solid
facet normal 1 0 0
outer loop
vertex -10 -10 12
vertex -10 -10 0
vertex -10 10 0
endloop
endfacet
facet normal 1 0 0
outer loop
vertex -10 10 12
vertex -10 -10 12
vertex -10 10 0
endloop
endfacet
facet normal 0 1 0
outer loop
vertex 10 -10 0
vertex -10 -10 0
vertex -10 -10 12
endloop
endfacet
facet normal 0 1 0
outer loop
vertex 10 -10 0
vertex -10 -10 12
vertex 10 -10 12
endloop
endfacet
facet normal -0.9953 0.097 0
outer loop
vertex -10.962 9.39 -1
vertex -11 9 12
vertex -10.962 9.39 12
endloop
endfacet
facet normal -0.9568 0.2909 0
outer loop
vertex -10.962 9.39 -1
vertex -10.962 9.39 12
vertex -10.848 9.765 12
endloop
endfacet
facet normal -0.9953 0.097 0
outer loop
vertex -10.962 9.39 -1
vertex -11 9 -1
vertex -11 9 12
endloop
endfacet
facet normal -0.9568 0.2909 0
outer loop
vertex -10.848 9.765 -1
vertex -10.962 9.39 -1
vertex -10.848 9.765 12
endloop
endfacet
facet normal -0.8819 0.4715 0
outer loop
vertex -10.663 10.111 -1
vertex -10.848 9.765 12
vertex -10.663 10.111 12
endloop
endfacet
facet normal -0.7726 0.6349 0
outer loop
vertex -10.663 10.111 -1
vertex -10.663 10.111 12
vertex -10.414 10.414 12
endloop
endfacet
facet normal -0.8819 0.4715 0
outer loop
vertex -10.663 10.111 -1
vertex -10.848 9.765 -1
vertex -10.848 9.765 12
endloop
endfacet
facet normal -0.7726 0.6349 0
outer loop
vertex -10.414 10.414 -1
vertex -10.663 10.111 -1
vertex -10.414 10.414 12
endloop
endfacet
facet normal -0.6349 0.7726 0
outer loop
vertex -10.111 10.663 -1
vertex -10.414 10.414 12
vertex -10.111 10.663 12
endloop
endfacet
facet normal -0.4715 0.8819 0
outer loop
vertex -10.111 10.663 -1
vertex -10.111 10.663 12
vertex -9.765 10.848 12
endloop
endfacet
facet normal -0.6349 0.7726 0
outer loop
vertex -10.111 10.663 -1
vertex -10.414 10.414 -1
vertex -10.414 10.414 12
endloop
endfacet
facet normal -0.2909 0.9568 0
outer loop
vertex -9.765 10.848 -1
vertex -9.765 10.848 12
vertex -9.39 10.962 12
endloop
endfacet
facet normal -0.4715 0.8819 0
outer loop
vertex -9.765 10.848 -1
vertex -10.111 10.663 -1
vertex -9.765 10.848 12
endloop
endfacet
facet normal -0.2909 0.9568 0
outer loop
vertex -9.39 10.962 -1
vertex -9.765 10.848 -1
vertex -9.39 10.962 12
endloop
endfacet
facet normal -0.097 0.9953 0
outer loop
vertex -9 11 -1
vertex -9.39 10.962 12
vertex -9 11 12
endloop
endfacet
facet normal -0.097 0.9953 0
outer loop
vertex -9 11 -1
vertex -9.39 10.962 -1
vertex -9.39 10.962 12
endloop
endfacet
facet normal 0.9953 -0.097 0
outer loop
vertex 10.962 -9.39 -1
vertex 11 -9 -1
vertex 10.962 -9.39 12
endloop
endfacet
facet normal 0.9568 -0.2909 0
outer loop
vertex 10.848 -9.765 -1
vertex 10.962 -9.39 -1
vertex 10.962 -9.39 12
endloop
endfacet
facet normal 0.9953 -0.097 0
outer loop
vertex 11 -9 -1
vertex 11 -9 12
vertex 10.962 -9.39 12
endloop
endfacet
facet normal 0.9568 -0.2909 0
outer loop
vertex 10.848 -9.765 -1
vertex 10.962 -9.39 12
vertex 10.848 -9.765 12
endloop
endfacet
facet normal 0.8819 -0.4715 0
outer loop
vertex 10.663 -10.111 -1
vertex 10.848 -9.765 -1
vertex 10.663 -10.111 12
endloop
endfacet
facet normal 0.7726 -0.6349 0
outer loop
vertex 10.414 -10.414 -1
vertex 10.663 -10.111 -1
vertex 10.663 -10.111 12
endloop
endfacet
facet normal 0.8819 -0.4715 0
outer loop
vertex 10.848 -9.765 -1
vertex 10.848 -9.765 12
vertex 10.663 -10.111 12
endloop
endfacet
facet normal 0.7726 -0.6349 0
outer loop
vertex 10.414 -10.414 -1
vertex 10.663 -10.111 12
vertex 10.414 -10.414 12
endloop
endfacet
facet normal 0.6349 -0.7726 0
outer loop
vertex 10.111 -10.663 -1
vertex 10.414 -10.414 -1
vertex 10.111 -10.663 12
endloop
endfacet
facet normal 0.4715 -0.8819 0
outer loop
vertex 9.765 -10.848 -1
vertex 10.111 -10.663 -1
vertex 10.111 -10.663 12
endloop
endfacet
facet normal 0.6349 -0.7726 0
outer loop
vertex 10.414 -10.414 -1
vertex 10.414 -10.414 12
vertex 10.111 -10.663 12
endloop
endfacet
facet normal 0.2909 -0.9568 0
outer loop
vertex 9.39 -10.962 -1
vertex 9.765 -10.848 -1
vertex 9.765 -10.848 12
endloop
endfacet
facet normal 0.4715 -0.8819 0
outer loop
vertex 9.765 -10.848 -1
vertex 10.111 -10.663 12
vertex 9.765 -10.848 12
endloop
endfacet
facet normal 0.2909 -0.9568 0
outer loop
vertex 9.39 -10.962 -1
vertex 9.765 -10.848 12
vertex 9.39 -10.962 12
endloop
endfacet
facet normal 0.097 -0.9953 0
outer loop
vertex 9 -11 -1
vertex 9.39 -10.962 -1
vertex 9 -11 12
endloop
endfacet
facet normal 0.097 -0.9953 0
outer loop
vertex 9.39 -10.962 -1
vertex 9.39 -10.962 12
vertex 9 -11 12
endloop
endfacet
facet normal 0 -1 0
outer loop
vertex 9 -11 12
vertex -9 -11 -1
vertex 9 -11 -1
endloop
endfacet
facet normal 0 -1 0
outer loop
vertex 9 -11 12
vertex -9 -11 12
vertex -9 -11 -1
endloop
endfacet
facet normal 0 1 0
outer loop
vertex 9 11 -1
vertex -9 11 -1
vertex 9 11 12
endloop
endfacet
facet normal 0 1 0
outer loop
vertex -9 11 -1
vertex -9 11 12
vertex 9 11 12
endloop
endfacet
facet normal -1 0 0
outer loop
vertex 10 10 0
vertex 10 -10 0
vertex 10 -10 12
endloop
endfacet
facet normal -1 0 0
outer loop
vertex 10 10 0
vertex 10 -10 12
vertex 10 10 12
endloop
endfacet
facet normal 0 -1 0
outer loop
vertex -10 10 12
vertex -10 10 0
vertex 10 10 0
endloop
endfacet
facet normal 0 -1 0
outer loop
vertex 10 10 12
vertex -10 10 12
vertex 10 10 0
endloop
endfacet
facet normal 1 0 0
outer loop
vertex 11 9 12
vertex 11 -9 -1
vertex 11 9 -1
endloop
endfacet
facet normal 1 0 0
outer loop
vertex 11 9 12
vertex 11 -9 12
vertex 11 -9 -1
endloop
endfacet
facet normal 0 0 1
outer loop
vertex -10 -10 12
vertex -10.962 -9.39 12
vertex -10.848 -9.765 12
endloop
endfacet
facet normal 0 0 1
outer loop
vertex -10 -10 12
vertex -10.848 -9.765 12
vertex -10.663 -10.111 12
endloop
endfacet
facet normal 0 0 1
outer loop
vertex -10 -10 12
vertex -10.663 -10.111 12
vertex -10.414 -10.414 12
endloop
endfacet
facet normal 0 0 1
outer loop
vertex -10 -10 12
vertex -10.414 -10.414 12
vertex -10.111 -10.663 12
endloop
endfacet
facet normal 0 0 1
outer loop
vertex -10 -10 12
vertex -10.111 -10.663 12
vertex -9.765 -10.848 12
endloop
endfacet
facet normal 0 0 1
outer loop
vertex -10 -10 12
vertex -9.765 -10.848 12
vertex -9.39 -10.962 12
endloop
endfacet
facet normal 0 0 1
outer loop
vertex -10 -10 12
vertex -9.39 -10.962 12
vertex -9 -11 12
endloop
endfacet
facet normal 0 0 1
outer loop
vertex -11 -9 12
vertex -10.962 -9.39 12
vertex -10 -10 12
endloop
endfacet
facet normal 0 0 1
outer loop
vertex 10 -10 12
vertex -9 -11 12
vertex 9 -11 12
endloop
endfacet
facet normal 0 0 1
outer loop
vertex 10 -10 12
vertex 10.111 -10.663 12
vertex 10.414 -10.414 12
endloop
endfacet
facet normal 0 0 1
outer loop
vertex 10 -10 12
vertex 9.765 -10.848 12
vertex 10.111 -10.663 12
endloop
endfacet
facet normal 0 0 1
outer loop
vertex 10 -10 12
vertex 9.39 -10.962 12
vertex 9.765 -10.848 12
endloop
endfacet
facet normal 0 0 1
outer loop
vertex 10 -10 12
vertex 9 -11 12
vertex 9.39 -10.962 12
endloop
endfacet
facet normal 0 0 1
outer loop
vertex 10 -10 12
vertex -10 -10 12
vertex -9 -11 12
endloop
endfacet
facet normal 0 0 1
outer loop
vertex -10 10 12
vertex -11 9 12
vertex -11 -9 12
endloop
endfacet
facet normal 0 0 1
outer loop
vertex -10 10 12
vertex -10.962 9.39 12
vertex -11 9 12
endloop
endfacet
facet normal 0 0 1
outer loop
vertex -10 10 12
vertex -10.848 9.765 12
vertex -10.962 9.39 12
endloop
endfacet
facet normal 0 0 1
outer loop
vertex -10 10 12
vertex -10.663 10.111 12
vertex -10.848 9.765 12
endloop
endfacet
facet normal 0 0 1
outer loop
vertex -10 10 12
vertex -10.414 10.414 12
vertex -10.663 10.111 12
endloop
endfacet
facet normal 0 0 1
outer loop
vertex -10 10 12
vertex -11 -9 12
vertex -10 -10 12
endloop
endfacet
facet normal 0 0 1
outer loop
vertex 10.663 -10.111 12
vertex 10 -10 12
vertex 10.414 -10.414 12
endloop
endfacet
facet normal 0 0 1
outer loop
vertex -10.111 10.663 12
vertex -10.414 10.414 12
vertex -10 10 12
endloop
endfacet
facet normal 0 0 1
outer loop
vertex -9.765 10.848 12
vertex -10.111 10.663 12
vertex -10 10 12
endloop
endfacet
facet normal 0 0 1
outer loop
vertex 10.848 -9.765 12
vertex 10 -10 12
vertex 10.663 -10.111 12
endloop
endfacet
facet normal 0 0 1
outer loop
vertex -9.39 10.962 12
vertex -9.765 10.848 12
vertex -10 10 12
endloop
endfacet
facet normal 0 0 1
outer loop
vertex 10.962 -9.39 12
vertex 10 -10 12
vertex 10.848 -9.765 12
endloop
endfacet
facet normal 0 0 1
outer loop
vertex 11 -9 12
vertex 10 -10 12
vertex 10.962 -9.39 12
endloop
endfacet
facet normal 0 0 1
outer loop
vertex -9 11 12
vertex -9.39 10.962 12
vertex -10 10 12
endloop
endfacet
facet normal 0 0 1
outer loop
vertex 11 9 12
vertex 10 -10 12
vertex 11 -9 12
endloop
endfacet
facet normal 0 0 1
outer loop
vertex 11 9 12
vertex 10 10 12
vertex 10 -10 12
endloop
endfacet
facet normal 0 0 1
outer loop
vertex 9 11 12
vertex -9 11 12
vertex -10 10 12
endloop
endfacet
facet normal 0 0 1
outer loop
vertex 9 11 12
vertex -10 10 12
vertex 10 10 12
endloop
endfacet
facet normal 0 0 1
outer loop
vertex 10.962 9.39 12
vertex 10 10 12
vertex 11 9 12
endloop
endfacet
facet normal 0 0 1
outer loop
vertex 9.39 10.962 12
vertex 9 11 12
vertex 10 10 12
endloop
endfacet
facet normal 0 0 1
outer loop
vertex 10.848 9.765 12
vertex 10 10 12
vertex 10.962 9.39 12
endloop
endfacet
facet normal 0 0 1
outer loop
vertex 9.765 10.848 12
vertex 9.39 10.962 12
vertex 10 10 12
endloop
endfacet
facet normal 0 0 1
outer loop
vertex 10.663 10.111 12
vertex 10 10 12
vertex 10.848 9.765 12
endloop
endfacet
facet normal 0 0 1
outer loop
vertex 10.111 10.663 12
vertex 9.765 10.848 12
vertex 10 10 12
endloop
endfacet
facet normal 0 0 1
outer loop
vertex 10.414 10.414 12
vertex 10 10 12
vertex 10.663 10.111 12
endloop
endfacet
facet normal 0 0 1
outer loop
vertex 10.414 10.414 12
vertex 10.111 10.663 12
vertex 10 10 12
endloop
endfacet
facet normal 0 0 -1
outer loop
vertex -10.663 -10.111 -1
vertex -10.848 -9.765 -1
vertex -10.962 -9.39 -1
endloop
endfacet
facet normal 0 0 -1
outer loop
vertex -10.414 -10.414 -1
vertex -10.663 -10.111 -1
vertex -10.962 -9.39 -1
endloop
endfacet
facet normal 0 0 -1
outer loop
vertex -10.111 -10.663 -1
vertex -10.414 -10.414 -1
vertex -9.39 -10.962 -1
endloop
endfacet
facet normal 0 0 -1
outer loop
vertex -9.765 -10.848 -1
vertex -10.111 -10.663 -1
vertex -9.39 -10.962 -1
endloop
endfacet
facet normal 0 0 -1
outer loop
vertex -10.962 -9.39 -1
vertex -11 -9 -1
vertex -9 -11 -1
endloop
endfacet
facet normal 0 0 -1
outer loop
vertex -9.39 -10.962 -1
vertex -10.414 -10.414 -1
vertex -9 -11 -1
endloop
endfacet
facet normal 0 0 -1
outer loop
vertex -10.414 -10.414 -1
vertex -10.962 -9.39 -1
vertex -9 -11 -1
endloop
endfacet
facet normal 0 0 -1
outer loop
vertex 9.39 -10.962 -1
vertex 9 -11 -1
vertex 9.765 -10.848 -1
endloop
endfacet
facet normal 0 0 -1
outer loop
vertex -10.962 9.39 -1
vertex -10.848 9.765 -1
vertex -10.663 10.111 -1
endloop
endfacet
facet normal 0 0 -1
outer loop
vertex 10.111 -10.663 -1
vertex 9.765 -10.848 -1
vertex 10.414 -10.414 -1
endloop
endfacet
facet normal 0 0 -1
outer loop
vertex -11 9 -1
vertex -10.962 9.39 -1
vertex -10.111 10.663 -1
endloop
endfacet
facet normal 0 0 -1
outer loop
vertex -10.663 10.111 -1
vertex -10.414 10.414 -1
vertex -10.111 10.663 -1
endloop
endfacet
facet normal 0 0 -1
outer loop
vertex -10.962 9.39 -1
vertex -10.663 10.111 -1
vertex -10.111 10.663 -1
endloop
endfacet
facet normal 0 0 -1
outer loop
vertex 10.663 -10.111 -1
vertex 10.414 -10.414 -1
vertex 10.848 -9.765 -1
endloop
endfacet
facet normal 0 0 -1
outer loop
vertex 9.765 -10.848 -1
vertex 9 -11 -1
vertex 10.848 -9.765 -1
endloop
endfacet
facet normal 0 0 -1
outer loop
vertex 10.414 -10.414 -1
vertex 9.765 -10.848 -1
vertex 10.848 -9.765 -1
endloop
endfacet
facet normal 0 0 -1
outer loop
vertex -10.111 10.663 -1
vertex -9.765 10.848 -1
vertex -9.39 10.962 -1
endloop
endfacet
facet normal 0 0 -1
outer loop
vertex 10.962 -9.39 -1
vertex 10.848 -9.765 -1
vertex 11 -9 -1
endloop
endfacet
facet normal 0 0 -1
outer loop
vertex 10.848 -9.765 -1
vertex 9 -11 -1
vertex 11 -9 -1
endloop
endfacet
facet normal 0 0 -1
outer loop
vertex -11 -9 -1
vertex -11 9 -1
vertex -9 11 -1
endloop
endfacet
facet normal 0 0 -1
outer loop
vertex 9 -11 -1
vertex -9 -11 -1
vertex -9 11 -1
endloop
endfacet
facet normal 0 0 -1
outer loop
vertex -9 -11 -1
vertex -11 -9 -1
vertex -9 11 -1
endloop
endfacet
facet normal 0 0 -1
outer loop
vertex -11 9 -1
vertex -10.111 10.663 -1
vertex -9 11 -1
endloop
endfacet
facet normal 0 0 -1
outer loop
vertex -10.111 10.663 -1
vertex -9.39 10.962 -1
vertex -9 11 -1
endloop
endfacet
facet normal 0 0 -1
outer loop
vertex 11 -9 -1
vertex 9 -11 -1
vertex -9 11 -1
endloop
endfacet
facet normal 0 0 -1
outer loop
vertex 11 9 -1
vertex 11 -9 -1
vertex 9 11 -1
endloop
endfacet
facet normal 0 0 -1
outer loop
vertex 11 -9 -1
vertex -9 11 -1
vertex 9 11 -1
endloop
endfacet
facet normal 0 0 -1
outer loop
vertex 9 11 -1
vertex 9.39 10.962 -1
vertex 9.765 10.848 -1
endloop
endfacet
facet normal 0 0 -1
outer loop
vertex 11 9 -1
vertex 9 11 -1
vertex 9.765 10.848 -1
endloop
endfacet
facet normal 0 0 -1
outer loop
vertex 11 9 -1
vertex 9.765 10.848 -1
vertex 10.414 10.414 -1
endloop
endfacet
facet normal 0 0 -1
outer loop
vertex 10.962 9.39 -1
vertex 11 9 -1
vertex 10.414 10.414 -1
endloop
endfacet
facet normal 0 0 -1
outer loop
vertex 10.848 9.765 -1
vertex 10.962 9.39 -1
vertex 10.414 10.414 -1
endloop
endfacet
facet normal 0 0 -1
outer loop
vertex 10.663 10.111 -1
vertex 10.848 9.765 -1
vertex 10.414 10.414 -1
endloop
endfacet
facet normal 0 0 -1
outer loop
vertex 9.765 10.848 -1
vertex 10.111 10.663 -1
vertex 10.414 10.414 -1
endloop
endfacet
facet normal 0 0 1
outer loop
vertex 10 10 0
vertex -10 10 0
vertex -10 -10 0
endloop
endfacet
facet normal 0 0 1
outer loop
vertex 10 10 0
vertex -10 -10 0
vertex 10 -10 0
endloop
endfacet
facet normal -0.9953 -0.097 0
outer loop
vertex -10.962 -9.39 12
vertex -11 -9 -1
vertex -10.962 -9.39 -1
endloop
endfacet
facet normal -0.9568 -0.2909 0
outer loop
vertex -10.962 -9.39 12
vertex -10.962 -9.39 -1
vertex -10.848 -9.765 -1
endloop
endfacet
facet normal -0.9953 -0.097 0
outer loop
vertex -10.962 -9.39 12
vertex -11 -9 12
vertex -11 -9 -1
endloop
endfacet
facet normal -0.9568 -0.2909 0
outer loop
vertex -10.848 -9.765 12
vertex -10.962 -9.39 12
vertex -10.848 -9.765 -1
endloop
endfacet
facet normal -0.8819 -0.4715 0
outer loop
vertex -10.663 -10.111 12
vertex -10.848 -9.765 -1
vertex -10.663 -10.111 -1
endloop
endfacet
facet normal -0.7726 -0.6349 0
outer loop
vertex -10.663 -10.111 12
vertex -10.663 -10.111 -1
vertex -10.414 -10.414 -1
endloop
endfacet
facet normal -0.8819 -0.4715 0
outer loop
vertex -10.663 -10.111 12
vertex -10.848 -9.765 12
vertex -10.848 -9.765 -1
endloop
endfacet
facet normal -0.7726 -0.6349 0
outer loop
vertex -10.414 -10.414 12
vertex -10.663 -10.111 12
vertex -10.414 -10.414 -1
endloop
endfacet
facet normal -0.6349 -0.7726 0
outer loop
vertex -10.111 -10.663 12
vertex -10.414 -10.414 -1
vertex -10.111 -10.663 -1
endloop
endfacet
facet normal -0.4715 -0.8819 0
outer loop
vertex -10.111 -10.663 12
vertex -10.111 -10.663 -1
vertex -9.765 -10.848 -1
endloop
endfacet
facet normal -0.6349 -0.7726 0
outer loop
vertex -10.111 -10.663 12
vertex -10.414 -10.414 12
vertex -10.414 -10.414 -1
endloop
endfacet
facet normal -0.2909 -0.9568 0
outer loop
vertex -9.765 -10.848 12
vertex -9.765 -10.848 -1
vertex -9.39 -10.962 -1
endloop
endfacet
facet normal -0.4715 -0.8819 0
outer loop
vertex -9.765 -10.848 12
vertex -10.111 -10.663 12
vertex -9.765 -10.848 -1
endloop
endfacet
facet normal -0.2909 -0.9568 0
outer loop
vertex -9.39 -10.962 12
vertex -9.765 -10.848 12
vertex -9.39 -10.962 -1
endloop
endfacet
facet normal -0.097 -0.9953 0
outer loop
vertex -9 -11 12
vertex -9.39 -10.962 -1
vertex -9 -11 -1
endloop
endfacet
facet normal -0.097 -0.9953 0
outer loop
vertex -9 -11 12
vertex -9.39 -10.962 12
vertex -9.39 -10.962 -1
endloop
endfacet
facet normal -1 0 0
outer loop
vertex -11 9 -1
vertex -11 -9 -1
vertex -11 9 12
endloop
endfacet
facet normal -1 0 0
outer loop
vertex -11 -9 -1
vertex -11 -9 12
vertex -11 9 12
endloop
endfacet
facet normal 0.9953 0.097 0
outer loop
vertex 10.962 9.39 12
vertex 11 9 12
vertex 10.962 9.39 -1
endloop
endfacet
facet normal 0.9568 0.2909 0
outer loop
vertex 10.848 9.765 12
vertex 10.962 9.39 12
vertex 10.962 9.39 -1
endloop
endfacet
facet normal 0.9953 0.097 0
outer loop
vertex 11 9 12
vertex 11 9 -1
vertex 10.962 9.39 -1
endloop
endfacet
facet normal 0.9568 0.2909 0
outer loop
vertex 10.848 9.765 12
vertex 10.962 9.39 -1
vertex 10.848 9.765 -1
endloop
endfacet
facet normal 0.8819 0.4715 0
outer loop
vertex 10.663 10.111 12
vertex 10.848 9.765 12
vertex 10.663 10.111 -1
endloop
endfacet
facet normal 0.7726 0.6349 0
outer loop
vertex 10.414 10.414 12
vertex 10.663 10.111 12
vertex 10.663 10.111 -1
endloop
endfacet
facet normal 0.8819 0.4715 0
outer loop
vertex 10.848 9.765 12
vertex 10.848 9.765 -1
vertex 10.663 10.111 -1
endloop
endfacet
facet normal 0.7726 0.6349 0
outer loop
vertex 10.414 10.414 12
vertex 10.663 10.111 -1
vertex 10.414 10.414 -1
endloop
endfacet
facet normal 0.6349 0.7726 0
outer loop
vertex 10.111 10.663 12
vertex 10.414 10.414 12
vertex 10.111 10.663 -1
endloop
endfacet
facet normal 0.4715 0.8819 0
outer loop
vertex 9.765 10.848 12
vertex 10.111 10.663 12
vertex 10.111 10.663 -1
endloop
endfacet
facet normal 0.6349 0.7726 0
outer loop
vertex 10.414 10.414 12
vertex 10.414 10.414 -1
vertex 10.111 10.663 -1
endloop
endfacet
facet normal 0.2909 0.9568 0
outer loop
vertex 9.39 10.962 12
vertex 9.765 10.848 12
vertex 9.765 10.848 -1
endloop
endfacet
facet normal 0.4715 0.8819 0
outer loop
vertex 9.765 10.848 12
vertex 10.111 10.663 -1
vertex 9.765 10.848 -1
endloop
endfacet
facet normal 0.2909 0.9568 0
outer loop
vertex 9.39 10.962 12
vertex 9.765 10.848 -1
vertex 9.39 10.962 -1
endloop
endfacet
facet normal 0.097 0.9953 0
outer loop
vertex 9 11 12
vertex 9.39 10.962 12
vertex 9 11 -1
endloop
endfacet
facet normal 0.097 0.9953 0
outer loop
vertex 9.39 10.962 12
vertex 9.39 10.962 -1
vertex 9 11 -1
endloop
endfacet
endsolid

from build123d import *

# Parameters (mm, degrees)
F0_W     = 22
F0_H     = 22
F0_W_2   = 20
F0_H_2   = 20
F1_DEPTH = 12
F2_DEPTH = 1
F3_R     = 2


with BuildPart() as f1:
    # F0 (on Top) → F1 (new body)
    with BuildSketch(Plane.XY):
        Rectangle(F0_W, F0_H)
        Rectangle(F0_W_2, F0_H_2, mode=Mode.SUBTRACT)
    extrude(amount=F1_DEPTH)

    # F0 (on Top) → F2 (join)
    with BuildSketch(Plane.XY):
        Rectangle(F0_W, F0_H)
        Rectangle(F0_W_2, F0_H_2, mode=Mode.SUBTRACT)
        Rectangle(F0_W_2, F0_H_2)
    extrude(amount=-F2_DEPTH)

    # F3
    f3_edges = [f1.edges().sort_by_distance(p)[0] for p in [
        (-11, 11, 5.5),
        (-11, -11, 5.5),
        (11, 11, 5.5),
        (11, -11, 5.5),
    ]]
    fillet(f3_edges, radius=F3_R)


solid = f1.part
